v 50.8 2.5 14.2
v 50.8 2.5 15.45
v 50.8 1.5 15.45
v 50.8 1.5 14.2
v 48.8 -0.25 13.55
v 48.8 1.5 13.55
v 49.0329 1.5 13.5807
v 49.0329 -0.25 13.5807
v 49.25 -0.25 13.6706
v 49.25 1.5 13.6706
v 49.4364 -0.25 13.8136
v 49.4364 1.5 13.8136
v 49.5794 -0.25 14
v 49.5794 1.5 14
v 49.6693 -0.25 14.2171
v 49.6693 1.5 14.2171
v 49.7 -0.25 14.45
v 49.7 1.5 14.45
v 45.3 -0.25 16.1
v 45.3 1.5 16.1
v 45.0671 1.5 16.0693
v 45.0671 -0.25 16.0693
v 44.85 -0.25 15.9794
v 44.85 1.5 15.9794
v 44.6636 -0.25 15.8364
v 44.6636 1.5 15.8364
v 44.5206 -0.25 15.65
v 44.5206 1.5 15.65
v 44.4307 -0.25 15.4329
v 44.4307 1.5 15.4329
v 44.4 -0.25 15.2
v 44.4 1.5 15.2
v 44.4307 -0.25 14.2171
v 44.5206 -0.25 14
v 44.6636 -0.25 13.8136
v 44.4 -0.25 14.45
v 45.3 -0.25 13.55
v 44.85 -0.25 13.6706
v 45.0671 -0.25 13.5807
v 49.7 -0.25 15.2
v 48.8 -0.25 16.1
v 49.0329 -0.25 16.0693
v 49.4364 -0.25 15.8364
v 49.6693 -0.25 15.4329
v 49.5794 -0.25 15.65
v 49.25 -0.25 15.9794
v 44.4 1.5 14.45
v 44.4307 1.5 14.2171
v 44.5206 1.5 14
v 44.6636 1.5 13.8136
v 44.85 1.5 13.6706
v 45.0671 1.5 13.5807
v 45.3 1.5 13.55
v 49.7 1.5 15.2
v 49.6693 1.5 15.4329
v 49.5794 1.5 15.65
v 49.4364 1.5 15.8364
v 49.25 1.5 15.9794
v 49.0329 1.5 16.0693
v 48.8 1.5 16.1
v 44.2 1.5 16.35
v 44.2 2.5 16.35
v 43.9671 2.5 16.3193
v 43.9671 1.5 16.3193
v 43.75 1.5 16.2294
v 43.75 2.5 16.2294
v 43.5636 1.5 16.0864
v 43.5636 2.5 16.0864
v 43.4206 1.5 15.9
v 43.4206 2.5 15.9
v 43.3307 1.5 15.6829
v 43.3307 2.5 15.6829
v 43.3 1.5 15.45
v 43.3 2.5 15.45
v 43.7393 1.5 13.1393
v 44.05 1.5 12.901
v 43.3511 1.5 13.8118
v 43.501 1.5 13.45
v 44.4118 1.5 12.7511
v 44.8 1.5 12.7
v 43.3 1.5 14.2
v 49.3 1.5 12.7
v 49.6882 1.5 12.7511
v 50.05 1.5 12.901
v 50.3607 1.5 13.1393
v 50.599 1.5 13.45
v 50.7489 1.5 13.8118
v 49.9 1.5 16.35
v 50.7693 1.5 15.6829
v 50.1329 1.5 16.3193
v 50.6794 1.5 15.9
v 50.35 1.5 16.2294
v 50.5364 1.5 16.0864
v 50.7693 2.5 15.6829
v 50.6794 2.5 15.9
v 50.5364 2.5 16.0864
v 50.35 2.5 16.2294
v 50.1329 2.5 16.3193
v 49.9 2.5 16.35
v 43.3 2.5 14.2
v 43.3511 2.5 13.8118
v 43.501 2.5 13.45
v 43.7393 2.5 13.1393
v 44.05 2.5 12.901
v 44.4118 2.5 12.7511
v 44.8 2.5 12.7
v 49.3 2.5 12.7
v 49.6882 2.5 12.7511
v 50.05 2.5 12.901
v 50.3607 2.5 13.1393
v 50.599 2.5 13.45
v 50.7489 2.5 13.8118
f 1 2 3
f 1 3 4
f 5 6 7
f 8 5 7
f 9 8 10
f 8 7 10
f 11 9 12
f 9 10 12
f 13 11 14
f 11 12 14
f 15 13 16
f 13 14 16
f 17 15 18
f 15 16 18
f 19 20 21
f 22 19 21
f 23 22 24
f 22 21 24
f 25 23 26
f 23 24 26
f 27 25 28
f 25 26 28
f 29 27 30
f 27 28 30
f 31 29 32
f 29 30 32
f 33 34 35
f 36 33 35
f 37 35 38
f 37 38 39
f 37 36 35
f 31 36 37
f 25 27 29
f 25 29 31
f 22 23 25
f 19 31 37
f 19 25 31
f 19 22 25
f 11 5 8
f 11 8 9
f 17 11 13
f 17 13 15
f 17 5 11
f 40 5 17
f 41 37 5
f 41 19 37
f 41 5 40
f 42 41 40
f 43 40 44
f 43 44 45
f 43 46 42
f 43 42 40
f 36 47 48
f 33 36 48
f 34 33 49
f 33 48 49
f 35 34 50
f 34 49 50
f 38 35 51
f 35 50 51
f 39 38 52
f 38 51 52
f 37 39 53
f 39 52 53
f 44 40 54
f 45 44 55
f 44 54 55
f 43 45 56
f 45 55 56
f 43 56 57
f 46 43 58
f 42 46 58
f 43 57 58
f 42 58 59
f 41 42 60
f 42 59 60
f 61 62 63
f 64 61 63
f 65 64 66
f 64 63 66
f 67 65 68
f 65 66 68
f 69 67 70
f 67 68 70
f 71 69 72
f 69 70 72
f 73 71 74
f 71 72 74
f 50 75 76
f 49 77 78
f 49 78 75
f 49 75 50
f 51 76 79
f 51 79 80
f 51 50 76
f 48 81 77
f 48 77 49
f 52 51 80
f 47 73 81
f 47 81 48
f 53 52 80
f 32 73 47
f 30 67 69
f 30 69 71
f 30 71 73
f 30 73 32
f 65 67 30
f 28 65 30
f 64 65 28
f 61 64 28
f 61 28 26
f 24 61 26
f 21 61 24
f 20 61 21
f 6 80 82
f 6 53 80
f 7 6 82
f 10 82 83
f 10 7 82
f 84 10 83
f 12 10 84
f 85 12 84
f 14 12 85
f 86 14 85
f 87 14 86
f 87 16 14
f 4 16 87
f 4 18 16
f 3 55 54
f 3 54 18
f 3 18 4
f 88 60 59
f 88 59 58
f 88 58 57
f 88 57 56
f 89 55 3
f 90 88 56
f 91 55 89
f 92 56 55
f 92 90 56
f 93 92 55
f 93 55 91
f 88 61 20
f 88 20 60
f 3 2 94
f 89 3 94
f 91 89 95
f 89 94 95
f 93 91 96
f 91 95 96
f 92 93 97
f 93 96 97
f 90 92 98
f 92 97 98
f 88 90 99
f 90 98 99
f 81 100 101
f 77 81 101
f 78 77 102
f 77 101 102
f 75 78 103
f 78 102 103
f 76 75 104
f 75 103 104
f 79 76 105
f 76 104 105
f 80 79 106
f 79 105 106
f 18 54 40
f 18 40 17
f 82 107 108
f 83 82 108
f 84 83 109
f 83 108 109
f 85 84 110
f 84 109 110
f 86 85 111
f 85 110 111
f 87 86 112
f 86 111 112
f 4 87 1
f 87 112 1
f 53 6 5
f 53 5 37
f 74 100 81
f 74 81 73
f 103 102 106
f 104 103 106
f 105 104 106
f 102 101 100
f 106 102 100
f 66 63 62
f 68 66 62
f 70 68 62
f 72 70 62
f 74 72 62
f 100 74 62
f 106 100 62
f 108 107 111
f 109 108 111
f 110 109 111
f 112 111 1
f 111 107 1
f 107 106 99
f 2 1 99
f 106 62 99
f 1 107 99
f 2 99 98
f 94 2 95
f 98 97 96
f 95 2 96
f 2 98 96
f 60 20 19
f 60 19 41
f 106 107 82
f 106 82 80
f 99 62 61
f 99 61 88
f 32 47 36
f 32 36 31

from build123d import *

# Parameters (mm, degrees)
EXTRUDE017_DEPTH = 1
EXTRUDE016_DEPTH = 2.25


with BuildPart() as extrude017:
    # Sketch017 → Extrude017 (new body)
    with BuildSketch(Plane.XZ):
        with BuildLine():
            ThreePointArc((11.7, 16.35), (11.063604, 16.086396), (10.8, 15.45))
            Line((10.8, 14.2), (10.8, 15.45))
            ThreePointArc((10.8, 14.2), (11.23934, 13.13934), (12.3, 12.7))
            Line((16.8, 12.7), (12.3, 12.7))
            ThreePointArc((16.8, 12.7), (17.86066, 13.13934), (18.3, 14.2))
            Line((18.3, 15.45), (18.3, 14.2))
            ThreePointArc((18.3, 15.45), (18.036396, 16.086396), (17.4, 16.35))
            Line((11.7, 16.35), (17.4, 16.35))
        make_face()
    extrude(amount=EXTRUDE017_DEPTH)


with BuildPart() as extrude017_1:
    # Extrude017 placement: moved
    add(extrude017.part.moved(Location((0, 2.5, 0))))


with BuildPart() as button002:
    # Sketch016 → Extrude016 (new body)
    with BuildSketch(Plane.XZ):
        with BuildLine():
            ThreePointArc((12.8, 16.1), (12.163604, 15.836396), (11.9, 15.2))
            Line((11.9, 14.45), (11.9, 15.2))
            ThreePointArc((11.9, 14.45), (12.163604, 13.813604), (12.8, 13.55))
            Line((16.3, 13.55), (12.8, 13.55))
            ThreePointArc((16.3, 13.55), (16.936396, 13.813604), (17.2, 14.45))
            Line((17.2, 15.2), (17.2, 14.45))
            ThreePointArc((17.2, 15.2), (16.936396, 15.836396), (16.3, 16.1))
            Line((12.8, 16.1), (16.3, 16.1))
        make_face()
    extrude(amount=EXTRUDE016_DEPTH)


with BuildPart() as button002_1:
    # Extrude016 placement: moved
    add(button002.part.moved(Location((0, 2, 0))))

    # Fusion021: union Extrude017
    add(extrude017_1.part)


with BuildPart() as button002_2:
    # Fusion021 placement: moved
    add(button002_1.part.moved(Location((32.5, 0, 0))))


solid = button002_2.part
